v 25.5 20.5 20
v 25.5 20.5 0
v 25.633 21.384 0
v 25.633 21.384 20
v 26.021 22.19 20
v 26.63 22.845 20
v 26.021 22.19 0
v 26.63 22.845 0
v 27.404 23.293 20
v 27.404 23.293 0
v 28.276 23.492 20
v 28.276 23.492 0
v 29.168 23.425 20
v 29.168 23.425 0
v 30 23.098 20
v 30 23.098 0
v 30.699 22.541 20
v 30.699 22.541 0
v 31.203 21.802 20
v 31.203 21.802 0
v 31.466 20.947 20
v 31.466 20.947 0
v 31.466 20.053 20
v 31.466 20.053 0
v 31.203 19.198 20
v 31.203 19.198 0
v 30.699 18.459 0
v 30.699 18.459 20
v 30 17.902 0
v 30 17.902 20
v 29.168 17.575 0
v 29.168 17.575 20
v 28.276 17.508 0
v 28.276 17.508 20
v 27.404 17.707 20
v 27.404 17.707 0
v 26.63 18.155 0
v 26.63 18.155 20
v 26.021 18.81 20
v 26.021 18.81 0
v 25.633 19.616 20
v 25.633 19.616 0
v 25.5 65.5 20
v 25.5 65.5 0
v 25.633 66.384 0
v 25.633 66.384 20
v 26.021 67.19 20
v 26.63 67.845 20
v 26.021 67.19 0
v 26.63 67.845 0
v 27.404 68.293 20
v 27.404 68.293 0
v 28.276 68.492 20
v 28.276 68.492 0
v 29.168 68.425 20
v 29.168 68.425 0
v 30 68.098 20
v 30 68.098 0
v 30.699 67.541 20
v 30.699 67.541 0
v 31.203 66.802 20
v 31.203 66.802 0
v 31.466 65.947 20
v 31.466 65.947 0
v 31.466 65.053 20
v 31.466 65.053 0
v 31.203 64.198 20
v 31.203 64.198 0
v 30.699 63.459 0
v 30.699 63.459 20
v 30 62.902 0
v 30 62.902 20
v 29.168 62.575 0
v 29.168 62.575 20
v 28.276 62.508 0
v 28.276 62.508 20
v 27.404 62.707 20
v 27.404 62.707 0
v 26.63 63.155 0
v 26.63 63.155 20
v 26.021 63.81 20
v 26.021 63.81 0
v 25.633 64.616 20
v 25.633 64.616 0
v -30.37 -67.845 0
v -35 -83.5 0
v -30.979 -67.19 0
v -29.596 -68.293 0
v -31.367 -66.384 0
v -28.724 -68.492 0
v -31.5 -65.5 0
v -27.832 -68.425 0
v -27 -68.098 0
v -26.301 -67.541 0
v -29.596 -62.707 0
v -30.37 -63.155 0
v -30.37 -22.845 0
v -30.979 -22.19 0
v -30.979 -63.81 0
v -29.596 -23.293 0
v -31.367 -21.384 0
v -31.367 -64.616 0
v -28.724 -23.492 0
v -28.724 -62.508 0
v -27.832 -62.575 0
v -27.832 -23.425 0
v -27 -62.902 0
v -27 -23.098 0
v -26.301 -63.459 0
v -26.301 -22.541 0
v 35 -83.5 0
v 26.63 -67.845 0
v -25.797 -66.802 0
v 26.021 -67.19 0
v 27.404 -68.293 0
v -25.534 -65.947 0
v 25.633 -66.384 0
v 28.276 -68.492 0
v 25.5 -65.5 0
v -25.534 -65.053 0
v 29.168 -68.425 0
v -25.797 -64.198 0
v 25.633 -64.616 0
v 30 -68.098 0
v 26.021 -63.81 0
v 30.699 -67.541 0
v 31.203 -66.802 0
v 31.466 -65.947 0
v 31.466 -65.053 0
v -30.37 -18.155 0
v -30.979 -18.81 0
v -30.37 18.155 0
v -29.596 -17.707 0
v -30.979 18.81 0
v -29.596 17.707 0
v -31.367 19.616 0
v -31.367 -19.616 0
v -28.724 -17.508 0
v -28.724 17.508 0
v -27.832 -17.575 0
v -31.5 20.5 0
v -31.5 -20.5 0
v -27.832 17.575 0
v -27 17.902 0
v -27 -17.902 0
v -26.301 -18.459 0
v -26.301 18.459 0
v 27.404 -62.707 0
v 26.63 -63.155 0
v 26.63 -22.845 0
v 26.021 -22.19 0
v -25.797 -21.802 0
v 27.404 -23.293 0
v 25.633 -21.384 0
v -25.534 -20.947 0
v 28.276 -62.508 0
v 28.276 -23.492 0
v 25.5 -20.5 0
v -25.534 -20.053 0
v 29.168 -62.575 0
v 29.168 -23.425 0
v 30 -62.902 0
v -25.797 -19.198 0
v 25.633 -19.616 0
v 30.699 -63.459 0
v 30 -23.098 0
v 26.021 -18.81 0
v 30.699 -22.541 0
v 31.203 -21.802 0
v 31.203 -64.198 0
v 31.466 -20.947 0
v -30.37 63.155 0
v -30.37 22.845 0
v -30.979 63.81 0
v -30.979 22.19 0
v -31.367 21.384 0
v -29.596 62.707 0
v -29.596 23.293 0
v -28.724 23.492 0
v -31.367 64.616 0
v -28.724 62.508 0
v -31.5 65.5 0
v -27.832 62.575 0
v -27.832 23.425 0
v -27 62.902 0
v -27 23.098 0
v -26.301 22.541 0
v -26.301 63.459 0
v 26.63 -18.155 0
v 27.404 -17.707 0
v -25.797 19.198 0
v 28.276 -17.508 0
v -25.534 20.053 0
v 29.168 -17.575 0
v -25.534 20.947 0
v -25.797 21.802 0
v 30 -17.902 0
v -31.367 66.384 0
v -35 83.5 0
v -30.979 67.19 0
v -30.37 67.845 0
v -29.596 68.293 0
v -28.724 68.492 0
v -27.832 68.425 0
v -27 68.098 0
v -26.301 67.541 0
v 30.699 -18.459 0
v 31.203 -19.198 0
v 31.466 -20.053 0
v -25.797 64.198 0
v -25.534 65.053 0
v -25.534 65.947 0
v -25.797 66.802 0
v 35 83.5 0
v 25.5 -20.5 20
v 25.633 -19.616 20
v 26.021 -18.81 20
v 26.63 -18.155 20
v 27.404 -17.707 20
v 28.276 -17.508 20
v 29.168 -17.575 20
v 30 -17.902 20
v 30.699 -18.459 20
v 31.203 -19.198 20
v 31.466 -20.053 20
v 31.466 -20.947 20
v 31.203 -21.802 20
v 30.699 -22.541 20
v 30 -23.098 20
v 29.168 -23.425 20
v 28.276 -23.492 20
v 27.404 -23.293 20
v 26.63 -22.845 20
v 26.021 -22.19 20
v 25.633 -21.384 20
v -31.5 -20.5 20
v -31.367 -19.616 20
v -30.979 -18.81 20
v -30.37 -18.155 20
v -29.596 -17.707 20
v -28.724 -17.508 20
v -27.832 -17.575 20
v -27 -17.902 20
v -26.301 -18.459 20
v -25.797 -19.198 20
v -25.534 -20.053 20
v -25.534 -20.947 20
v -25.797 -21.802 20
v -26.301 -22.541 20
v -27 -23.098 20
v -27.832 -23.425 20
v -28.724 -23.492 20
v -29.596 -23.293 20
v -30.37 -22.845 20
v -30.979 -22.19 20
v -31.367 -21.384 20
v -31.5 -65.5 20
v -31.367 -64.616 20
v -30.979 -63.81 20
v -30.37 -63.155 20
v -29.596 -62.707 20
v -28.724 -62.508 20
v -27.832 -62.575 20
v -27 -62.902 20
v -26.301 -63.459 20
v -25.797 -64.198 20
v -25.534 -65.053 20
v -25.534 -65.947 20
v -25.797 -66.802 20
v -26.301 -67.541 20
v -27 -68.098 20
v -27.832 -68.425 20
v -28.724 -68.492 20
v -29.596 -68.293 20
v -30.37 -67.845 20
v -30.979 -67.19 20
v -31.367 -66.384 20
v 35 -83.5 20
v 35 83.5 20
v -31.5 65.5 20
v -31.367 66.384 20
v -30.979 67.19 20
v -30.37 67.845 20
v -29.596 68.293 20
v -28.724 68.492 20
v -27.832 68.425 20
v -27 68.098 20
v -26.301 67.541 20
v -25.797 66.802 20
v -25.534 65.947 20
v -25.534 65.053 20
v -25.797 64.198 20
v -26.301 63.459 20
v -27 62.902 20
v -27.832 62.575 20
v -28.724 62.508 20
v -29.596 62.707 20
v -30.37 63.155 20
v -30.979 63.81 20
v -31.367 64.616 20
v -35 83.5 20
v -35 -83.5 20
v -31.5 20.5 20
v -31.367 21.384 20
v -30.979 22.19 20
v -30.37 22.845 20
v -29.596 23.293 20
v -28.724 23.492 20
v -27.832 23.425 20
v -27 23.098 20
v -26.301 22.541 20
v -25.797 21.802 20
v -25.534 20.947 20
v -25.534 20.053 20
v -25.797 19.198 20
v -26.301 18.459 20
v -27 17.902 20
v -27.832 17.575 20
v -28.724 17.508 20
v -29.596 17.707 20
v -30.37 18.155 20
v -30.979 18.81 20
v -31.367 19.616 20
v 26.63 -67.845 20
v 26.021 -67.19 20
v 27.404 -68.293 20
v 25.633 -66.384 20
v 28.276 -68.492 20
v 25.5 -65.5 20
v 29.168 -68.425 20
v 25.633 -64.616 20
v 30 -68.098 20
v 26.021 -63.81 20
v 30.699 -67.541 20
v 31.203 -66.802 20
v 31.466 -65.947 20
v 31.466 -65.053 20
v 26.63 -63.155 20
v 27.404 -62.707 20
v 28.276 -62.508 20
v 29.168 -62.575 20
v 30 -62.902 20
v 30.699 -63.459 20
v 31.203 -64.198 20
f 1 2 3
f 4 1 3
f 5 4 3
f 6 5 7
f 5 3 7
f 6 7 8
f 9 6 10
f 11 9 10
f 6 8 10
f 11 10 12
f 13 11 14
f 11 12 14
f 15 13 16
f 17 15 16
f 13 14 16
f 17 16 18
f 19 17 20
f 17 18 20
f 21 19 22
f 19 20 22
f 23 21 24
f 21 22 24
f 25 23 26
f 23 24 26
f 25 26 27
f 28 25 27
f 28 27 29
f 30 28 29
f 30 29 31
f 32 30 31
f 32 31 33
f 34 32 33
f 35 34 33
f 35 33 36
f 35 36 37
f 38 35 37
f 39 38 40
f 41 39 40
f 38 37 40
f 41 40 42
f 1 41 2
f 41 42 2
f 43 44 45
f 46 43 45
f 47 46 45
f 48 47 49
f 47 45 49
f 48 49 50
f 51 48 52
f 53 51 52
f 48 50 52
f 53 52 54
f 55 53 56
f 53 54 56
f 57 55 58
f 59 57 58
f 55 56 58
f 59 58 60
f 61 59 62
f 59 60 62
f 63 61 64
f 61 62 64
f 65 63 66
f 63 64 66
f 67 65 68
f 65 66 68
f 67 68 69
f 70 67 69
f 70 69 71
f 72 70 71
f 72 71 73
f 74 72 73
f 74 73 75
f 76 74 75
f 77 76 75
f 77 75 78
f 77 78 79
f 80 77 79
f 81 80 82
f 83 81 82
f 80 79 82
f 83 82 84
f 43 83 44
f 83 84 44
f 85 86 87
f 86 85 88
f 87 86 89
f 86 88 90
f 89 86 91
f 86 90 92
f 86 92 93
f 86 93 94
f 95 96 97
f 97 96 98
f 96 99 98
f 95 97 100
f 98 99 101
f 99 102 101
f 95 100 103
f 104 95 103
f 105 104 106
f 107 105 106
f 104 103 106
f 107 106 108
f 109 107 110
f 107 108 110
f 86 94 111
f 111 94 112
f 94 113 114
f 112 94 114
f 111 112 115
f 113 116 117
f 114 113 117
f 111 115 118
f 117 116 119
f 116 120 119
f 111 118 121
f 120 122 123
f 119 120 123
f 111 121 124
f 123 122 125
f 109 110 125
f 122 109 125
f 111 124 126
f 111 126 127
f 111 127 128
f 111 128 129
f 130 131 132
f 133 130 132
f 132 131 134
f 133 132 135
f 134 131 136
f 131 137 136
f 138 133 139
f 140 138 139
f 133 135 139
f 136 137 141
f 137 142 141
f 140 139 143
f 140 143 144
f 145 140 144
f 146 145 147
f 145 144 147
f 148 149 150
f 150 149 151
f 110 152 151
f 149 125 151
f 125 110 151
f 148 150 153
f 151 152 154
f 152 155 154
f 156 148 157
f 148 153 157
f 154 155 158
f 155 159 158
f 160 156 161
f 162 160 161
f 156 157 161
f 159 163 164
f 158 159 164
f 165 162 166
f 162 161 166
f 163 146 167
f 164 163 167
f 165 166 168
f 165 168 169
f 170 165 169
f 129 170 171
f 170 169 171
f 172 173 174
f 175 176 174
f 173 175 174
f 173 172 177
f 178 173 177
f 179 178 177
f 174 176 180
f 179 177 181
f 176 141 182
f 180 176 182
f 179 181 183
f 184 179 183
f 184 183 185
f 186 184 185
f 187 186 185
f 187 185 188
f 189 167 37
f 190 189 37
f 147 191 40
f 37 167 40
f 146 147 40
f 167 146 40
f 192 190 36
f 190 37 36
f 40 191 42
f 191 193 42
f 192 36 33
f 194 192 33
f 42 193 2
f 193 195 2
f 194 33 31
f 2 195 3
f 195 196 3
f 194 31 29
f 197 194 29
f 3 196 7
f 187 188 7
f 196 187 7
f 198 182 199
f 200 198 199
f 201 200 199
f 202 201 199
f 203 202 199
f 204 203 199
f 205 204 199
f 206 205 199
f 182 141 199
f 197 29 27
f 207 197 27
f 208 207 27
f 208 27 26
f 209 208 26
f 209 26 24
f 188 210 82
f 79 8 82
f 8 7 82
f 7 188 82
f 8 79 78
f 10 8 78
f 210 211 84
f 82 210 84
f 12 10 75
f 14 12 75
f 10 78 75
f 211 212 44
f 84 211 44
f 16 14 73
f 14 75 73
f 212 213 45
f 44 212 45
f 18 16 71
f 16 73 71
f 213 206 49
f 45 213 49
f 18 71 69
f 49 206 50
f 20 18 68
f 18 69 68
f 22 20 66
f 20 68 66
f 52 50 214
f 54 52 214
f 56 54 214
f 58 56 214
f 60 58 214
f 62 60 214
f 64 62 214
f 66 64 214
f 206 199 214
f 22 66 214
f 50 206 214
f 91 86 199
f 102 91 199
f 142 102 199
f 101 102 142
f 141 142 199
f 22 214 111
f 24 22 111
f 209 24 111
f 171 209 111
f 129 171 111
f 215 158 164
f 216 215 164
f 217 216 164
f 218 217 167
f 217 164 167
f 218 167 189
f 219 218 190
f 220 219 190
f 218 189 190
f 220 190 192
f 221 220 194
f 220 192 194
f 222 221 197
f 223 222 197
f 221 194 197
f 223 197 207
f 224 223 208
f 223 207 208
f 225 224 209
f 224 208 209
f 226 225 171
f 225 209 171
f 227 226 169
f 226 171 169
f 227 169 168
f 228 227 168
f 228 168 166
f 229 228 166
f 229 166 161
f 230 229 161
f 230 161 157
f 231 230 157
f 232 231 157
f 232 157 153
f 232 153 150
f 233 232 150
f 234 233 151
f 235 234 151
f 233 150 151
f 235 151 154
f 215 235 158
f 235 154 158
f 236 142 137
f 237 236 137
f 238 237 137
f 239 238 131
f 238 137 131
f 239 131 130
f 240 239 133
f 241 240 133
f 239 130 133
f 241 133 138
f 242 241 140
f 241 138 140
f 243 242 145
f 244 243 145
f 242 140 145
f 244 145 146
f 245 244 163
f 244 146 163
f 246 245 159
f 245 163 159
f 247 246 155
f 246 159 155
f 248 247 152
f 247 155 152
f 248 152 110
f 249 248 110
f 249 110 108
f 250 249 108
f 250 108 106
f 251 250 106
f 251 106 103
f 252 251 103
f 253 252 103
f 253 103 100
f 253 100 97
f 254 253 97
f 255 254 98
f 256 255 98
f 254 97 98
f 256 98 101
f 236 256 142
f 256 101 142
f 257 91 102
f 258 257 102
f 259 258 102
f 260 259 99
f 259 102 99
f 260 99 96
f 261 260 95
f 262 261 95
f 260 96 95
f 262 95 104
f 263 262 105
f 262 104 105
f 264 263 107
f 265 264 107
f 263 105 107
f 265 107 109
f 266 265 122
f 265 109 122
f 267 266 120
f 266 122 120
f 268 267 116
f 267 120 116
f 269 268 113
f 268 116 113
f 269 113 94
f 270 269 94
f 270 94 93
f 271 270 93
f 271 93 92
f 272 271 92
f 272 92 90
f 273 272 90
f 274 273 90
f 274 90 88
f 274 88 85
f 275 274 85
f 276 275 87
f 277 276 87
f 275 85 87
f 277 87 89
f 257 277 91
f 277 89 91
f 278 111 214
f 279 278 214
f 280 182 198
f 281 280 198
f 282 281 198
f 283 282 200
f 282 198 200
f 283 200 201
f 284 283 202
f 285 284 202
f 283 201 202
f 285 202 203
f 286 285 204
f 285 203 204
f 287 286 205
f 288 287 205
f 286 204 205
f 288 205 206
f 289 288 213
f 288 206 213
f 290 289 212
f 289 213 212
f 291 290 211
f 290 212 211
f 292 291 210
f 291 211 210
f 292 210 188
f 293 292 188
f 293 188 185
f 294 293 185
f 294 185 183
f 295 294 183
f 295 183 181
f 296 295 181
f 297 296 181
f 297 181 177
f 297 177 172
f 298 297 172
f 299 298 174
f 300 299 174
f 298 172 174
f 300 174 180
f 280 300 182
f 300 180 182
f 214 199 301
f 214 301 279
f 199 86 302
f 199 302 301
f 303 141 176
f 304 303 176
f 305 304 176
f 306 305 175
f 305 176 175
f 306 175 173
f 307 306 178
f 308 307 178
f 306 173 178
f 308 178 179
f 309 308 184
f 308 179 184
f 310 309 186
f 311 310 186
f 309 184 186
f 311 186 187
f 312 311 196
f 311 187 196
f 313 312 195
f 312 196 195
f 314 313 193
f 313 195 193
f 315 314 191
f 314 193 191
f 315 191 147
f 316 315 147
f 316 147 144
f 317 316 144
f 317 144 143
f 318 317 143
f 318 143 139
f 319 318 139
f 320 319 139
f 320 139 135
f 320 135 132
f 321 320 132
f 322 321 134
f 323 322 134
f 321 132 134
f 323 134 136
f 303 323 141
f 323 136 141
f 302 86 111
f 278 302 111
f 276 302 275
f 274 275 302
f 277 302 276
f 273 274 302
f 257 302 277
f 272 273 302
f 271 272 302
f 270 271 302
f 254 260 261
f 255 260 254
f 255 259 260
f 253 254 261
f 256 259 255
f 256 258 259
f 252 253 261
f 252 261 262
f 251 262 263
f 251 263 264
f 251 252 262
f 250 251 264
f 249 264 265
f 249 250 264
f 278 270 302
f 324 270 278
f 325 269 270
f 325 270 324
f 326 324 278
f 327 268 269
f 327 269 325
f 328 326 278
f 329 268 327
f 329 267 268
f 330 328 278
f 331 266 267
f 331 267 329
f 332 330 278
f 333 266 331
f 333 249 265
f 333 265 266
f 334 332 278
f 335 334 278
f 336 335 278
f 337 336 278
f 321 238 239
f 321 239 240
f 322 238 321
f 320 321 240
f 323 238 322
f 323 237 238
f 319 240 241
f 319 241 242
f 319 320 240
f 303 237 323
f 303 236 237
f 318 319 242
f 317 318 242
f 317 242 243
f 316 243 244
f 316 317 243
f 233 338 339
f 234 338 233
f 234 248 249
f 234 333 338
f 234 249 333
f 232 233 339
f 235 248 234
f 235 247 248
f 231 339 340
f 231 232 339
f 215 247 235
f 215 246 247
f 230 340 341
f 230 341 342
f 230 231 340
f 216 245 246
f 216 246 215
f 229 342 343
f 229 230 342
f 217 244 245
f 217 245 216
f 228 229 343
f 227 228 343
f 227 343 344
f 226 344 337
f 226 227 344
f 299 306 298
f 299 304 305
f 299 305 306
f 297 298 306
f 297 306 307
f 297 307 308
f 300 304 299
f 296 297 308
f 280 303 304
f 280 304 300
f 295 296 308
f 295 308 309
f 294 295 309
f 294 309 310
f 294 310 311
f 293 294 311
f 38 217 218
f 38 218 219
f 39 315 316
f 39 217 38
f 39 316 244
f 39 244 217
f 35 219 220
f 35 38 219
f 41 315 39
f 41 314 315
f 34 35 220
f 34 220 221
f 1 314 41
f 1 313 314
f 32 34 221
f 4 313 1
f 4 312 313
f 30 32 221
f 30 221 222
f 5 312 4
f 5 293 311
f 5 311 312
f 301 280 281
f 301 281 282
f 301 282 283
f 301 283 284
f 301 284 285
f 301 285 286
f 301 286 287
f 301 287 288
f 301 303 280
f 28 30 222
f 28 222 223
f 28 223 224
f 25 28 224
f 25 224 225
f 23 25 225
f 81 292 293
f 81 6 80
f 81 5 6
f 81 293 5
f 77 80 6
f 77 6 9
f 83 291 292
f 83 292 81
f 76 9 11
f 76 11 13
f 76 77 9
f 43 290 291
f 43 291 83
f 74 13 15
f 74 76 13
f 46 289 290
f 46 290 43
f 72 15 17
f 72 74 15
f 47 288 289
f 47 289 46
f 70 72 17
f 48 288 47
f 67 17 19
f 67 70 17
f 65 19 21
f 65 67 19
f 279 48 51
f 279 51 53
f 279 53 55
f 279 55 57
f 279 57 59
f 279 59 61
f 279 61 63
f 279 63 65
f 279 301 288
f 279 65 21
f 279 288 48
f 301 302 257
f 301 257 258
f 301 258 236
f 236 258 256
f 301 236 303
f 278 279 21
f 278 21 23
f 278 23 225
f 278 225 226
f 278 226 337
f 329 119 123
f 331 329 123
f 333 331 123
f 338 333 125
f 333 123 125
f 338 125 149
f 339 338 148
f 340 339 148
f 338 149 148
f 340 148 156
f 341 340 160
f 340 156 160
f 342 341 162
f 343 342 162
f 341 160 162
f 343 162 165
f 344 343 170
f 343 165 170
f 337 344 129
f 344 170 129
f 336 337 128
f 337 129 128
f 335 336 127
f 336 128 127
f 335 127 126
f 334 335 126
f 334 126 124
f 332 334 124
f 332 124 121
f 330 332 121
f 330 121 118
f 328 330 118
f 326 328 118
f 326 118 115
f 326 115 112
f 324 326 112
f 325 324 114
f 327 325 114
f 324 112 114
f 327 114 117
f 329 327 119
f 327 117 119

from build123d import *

# Parameters (mm, degrees)
SCHIZZO1_W                   = 70
SCHIZZO1_H                   = 167
ESTRUSIONE_ESTRUSIONE1_DEPTH = 20
SCHIZZO2_R                   = 3
TAGLIO_ESTRUSIONE1_DEPTH     = 20


with BuildPart() as part:
    # Schizzo1 → Estrusione-Estrusione1 (new body)
    with BuildSketch(Plane.XY):
        Rectangle(SCHIZZO1_W, SCHIZZO1_H)
    extrude(amount=ESTRUSIONE_ESTRUSIONE1_DEPTH)

    # Schizzo2 → Taglio-Estrusione1 (cut)
    with BuildSketch(Plane(origin=(0, 0, 0), x_dir=(-1, 0, 0), z_dir=(0, 0, -1))):
        with Locations((-28.5, 65.5)):
            Circle(SCHIZZO2_R)
        with Locations((28.5, 65.5)):
            Circle(SCHIZZO2_R)
        with Locations((-28.5, 20.5)):
            Circle(SCHIZZO2_R)
        with Locations((28.5, 20.5)):
            Circle(SCHIZZO2_R)
        with Locations((-28.5, -20.5)):
            Circle(SCHIZZO2_R)
        with Locations((28.5, -20.5)):
            Circle(SCHIZZO2_R)
        with Locations((-28.5, -65.5)):
            Circle(SCHIZZO2_R)
        with Locations((28.5, -65.5)):
            Circle(SCHIZZO2_R)
    extrude(amount=-TAGLIO_ESTRUSIONE1_DEPTH, mode=Mode.SUBTRACT)


solid = part.part
